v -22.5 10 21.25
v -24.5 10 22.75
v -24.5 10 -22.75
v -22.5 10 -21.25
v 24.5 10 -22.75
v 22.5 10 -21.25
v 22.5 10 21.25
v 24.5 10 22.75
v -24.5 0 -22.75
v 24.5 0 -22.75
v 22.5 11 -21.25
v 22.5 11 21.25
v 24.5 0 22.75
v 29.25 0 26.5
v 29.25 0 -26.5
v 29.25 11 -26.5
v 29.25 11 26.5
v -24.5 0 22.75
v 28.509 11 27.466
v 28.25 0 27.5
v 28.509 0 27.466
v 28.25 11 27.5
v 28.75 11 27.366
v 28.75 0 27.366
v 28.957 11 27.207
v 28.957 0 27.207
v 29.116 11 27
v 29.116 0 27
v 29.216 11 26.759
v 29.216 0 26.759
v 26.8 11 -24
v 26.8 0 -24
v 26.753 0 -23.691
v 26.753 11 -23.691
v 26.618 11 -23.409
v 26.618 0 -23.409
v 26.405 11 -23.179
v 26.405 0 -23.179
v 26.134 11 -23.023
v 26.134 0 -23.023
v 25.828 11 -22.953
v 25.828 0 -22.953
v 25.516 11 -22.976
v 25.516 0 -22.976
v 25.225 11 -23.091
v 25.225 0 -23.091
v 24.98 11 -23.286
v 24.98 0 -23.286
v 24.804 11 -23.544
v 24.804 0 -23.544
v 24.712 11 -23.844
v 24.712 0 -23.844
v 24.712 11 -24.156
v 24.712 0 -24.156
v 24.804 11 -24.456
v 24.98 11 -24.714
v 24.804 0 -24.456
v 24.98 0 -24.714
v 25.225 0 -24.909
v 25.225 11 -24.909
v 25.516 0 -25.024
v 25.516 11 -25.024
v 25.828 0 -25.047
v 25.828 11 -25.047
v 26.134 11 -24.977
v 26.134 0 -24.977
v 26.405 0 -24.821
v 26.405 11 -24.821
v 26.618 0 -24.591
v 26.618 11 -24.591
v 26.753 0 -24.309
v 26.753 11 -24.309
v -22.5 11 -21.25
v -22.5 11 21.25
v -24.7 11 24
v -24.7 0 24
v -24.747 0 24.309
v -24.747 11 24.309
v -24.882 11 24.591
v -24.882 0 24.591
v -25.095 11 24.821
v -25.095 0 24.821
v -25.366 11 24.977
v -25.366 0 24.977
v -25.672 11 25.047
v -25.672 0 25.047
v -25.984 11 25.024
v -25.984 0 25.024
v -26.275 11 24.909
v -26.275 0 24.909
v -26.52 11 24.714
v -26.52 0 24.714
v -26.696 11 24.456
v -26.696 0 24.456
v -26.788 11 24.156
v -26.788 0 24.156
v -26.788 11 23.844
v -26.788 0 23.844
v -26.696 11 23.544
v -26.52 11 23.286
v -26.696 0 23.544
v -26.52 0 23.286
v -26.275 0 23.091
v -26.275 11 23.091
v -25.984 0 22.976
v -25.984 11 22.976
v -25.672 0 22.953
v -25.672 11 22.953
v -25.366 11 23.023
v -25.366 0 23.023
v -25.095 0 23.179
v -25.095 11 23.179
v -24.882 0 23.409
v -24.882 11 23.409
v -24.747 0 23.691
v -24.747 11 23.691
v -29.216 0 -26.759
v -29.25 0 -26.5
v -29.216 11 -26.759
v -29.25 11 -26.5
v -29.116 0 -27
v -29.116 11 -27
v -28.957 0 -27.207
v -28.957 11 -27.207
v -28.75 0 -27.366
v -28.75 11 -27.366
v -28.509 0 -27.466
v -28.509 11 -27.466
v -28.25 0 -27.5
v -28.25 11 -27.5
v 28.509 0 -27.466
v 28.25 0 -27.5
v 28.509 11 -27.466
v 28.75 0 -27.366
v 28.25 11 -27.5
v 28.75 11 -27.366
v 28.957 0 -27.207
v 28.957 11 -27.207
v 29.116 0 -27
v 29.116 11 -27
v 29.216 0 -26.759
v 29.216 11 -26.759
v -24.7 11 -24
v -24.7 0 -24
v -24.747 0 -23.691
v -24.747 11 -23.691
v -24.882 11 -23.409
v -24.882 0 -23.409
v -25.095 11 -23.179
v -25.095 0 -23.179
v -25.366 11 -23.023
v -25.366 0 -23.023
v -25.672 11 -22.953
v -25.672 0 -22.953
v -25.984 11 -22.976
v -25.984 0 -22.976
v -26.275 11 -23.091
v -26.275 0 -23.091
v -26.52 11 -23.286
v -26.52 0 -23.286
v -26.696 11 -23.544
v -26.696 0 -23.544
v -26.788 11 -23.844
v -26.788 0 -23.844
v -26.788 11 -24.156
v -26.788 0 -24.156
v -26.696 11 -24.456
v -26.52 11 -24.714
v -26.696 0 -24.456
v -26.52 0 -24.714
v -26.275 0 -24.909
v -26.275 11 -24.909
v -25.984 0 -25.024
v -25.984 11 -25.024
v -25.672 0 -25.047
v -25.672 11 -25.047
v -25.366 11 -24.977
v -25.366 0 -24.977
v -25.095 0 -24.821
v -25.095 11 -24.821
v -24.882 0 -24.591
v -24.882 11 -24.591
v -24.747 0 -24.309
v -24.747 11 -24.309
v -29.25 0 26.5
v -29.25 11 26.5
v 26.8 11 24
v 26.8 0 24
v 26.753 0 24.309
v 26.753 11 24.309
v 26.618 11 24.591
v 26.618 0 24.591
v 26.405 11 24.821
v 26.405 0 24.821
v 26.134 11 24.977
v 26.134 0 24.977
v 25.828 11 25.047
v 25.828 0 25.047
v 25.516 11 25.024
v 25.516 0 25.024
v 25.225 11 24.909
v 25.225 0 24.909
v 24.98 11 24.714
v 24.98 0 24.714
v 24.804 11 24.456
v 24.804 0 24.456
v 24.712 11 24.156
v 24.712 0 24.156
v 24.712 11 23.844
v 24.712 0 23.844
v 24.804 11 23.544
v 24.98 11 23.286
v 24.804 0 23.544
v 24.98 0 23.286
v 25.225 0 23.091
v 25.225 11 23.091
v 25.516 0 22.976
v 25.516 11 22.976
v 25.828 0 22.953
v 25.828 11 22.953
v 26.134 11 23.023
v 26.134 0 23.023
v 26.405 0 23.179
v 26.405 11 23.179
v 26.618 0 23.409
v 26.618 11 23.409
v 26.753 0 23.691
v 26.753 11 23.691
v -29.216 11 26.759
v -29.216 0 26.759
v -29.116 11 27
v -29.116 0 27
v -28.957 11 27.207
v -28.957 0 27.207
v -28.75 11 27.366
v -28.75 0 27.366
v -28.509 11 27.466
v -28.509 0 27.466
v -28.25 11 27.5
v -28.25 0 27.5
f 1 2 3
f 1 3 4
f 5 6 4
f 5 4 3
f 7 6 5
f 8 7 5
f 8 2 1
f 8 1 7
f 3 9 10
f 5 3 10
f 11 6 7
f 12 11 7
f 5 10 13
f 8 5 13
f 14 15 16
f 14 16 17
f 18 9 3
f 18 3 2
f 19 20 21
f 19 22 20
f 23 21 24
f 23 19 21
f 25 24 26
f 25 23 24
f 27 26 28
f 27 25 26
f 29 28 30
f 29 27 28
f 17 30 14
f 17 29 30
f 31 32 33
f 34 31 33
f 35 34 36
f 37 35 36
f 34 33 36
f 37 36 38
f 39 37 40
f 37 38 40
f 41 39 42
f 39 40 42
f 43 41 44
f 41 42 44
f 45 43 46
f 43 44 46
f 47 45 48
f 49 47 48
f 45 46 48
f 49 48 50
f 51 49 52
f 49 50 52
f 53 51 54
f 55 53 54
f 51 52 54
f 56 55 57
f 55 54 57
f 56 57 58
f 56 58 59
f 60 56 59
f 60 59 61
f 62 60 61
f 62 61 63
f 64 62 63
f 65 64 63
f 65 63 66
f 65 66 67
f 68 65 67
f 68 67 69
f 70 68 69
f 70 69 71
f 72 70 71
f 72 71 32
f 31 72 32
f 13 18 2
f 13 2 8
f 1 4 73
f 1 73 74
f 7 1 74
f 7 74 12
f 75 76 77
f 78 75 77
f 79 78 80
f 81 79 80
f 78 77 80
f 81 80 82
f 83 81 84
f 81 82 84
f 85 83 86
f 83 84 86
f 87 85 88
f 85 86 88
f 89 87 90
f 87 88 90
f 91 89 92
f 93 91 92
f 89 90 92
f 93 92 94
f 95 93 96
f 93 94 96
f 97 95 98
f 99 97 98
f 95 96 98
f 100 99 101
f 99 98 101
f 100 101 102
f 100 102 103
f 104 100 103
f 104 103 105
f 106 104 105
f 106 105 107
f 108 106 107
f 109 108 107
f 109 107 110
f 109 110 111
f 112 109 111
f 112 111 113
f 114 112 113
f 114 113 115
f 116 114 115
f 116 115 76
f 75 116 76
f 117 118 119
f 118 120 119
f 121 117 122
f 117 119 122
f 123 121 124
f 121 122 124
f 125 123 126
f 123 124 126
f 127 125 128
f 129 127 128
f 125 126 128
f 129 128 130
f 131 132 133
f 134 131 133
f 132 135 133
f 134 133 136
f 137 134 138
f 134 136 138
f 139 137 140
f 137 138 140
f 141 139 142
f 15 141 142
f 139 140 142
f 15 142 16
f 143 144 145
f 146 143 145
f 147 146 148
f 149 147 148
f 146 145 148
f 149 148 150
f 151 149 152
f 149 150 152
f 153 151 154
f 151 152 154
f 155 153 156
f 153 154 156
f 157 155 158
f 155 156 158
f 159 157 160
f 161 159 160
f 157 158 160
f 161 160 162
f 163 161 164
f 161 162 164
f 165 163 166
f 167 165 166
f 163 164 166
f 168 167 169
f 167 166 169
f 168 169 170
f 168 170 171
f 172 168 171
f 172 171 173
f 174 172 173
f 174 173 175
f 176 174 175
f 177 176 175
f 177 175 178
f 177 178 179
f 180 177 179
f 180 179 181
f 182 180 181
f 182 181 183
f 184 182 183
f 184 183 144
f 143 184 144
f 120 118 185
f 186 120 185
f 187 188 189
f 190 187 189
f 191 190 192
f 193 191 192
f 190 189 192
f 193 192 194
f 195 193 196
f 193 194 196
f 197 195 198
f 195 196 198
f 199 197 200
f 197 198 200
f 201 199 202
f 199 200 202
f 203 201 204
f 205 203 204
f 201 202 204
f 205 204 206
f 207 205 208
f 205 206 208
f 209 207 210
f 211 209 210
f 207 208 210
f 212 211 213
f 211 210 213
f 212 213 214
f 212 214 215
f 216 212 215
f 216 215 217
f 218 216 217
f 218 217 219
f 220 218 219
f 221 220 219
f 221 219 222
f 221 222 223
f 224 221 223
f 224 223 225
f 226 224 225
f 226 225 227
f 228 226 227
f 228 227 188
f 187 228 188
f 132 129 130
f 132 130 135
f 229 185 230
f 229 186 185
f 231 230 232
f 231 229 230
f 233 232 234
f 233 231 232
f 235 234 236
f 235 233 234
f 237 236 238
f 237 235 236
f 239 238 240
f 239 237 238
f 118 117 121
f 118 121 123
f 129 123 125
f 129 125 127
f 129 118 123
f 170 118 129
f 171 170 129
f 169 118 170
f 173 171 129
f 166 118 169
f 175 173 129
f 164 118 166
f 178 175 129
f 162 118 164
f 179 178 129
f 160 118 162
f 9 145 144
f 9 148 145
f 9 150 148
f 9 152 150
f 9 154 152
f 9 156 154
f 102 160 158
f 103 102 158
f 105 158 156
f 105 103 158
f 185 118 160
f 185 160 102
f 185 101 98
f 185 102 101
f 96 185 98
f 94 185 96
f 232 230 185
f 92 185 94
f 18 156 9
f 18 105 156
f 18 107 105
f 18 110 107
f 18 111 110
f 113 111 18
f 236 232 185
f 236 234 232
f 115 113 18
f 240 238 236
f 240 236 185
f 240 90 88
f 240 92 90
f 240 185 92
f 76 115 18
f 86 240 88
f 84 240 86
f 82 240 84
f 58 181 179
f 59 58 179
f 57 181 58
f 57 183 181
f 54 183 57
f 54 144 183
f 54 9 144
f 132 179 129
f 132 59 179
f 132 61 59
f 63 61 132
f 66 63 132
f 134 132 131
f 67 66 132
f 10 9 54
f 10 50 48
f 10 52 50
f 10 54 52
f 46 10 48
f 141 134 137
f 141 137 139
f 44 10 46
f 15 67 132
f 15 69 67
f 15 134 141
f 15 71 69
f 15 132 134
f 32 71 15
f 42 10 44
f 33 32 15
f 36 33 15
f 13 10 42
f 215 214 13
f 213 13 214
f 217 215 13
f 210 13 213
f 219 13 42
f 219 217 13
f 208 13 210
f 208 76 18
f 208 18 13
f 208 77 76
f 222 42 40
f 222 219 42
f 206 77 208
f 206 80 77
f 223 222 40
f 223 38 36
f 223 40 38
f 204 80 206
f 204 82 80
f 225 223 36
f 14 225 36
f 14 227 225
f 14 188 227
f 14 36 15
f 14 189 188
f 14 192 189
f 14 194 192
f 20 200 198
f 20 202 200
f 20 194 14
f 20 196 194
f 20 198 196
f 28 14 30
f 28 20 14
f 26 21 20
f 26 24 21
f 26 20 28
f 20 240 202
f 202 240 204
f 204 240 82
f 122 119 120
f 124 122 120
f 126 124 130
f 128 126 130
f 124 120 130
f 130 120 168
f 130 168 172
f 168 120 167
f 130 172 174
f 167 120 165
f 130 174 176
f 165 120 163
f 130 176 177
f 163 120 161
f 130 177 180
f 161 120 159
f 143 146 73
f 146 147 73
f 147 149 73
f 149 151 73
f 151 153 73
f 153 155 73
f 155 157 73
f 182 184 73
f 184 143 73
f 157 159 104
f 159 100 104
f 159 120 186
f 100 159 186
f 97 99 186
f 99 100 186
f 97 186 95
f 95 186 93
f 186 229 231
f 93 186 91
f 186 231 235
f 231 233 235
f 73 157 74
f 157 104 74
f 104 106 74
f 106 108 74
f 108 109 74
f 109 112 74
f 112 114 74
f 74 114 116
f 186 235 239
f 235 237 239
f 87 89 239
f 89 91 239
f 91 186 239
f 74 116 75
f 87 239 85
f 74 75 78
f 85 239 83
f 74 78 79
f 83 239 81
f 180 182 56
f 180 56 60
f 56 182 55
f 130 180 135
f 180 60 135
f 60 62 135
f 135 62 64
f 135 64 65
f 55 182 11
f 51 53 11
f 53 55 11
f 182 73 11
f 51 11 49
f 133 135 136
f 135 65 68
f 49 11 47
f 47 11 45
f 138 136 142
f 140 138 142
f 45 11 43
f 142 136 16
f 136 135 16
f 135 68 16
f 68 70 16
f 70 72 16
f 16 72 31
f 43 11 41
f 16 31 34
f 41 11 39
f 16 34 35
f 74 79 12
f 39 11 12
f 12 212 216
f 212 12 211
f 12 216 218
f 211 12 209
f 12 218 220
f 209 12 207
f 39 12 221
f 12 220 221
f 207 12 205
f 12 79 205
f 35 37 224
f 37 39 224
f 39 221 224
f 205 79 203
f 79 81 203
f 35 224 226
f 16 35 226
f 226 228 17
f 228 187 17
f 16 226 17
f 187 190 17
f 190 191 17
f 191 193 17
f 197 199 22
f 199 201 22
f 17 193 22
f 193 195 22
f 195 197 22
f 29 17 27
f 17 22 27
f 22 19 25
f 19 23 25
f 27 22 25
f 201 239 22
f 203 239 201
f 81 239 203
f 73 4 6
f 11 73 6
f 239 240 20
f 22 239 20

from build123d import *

# Parameters (mm, degrees)
SKETCH009_W     = 58.5
SKETCH009_H     = 55
PAD005_DEPTH    = 11
SKETCH010_W     = 49
SKETCH010_H     = 45.5
POCKET004_DEPTH = 10
SKETCH011_W     = 45
SKETCH011_H     = 42.5
POCKET005_DEPTH = 5
SKETCH012_R     = 1.05
POCKET006_DEPTH = 12
FILLET003_R     = 1


with BuildPart() as part:
    # Sketch009 → Pad005 (new body)
    with BuildSketch(Plane.XZ):
        Rectangle(SKETCH009_W, SKETCH009_H)
    extrude(amount=-PAD005_DEPTH)

    # Sketch010 (on Face5 of Pad005) → Pocket004 (cut)
    with BuildSketch(Plane.XZ):
        Rectangle(SKETCH010_W, SKETCH010_H)
    extrude(amount=-POCKET004_DEPTH, mode=Mode.SUBTRACT)

    # Sketch011 (on Face11 of Pocket004) → Pocket005 (cut)
    with BuildSketch(Plane.XZ.offset(-10)):
        Rectangle(SKETCH011_W, SKETCH011_H)
    extrude(amount=-POCKET005_DEPTH, mode=Mode.SUBTRACT)

    # Sketch012 (on Face4 of Pocket005) → Pocket006 (cut)
    with BuildSketch(Plane.XZ):
        with Locations((-25.75, 24)):
            Circle(SKETCH012_R)
        with Locations((25.75, 24)):
            Circle(SKETCH012_R)
        with Locations((-25.75, -24)):
            Circle(SKETCH012_R)
        with Locations((25.75, -24)):
            Circle(SKETCH012_R)
    extrude(amount=-POCKET006_DEPTH, mode=Mode.SUBTRACT)

    # Fillet003
    fillet003_edges = [part.edges().sort_by_distance(p)[0] for p in [
        (29.25, 5.5, 27.5),
        (29.25, 5.5, -27.5),
        (-29.25, 5.5, 27.5),
        (-29.25, 5.5, -27.5),
    ]]
    fillet(fillet003_edges, radius=FILLET003_R)


solid = part.part
